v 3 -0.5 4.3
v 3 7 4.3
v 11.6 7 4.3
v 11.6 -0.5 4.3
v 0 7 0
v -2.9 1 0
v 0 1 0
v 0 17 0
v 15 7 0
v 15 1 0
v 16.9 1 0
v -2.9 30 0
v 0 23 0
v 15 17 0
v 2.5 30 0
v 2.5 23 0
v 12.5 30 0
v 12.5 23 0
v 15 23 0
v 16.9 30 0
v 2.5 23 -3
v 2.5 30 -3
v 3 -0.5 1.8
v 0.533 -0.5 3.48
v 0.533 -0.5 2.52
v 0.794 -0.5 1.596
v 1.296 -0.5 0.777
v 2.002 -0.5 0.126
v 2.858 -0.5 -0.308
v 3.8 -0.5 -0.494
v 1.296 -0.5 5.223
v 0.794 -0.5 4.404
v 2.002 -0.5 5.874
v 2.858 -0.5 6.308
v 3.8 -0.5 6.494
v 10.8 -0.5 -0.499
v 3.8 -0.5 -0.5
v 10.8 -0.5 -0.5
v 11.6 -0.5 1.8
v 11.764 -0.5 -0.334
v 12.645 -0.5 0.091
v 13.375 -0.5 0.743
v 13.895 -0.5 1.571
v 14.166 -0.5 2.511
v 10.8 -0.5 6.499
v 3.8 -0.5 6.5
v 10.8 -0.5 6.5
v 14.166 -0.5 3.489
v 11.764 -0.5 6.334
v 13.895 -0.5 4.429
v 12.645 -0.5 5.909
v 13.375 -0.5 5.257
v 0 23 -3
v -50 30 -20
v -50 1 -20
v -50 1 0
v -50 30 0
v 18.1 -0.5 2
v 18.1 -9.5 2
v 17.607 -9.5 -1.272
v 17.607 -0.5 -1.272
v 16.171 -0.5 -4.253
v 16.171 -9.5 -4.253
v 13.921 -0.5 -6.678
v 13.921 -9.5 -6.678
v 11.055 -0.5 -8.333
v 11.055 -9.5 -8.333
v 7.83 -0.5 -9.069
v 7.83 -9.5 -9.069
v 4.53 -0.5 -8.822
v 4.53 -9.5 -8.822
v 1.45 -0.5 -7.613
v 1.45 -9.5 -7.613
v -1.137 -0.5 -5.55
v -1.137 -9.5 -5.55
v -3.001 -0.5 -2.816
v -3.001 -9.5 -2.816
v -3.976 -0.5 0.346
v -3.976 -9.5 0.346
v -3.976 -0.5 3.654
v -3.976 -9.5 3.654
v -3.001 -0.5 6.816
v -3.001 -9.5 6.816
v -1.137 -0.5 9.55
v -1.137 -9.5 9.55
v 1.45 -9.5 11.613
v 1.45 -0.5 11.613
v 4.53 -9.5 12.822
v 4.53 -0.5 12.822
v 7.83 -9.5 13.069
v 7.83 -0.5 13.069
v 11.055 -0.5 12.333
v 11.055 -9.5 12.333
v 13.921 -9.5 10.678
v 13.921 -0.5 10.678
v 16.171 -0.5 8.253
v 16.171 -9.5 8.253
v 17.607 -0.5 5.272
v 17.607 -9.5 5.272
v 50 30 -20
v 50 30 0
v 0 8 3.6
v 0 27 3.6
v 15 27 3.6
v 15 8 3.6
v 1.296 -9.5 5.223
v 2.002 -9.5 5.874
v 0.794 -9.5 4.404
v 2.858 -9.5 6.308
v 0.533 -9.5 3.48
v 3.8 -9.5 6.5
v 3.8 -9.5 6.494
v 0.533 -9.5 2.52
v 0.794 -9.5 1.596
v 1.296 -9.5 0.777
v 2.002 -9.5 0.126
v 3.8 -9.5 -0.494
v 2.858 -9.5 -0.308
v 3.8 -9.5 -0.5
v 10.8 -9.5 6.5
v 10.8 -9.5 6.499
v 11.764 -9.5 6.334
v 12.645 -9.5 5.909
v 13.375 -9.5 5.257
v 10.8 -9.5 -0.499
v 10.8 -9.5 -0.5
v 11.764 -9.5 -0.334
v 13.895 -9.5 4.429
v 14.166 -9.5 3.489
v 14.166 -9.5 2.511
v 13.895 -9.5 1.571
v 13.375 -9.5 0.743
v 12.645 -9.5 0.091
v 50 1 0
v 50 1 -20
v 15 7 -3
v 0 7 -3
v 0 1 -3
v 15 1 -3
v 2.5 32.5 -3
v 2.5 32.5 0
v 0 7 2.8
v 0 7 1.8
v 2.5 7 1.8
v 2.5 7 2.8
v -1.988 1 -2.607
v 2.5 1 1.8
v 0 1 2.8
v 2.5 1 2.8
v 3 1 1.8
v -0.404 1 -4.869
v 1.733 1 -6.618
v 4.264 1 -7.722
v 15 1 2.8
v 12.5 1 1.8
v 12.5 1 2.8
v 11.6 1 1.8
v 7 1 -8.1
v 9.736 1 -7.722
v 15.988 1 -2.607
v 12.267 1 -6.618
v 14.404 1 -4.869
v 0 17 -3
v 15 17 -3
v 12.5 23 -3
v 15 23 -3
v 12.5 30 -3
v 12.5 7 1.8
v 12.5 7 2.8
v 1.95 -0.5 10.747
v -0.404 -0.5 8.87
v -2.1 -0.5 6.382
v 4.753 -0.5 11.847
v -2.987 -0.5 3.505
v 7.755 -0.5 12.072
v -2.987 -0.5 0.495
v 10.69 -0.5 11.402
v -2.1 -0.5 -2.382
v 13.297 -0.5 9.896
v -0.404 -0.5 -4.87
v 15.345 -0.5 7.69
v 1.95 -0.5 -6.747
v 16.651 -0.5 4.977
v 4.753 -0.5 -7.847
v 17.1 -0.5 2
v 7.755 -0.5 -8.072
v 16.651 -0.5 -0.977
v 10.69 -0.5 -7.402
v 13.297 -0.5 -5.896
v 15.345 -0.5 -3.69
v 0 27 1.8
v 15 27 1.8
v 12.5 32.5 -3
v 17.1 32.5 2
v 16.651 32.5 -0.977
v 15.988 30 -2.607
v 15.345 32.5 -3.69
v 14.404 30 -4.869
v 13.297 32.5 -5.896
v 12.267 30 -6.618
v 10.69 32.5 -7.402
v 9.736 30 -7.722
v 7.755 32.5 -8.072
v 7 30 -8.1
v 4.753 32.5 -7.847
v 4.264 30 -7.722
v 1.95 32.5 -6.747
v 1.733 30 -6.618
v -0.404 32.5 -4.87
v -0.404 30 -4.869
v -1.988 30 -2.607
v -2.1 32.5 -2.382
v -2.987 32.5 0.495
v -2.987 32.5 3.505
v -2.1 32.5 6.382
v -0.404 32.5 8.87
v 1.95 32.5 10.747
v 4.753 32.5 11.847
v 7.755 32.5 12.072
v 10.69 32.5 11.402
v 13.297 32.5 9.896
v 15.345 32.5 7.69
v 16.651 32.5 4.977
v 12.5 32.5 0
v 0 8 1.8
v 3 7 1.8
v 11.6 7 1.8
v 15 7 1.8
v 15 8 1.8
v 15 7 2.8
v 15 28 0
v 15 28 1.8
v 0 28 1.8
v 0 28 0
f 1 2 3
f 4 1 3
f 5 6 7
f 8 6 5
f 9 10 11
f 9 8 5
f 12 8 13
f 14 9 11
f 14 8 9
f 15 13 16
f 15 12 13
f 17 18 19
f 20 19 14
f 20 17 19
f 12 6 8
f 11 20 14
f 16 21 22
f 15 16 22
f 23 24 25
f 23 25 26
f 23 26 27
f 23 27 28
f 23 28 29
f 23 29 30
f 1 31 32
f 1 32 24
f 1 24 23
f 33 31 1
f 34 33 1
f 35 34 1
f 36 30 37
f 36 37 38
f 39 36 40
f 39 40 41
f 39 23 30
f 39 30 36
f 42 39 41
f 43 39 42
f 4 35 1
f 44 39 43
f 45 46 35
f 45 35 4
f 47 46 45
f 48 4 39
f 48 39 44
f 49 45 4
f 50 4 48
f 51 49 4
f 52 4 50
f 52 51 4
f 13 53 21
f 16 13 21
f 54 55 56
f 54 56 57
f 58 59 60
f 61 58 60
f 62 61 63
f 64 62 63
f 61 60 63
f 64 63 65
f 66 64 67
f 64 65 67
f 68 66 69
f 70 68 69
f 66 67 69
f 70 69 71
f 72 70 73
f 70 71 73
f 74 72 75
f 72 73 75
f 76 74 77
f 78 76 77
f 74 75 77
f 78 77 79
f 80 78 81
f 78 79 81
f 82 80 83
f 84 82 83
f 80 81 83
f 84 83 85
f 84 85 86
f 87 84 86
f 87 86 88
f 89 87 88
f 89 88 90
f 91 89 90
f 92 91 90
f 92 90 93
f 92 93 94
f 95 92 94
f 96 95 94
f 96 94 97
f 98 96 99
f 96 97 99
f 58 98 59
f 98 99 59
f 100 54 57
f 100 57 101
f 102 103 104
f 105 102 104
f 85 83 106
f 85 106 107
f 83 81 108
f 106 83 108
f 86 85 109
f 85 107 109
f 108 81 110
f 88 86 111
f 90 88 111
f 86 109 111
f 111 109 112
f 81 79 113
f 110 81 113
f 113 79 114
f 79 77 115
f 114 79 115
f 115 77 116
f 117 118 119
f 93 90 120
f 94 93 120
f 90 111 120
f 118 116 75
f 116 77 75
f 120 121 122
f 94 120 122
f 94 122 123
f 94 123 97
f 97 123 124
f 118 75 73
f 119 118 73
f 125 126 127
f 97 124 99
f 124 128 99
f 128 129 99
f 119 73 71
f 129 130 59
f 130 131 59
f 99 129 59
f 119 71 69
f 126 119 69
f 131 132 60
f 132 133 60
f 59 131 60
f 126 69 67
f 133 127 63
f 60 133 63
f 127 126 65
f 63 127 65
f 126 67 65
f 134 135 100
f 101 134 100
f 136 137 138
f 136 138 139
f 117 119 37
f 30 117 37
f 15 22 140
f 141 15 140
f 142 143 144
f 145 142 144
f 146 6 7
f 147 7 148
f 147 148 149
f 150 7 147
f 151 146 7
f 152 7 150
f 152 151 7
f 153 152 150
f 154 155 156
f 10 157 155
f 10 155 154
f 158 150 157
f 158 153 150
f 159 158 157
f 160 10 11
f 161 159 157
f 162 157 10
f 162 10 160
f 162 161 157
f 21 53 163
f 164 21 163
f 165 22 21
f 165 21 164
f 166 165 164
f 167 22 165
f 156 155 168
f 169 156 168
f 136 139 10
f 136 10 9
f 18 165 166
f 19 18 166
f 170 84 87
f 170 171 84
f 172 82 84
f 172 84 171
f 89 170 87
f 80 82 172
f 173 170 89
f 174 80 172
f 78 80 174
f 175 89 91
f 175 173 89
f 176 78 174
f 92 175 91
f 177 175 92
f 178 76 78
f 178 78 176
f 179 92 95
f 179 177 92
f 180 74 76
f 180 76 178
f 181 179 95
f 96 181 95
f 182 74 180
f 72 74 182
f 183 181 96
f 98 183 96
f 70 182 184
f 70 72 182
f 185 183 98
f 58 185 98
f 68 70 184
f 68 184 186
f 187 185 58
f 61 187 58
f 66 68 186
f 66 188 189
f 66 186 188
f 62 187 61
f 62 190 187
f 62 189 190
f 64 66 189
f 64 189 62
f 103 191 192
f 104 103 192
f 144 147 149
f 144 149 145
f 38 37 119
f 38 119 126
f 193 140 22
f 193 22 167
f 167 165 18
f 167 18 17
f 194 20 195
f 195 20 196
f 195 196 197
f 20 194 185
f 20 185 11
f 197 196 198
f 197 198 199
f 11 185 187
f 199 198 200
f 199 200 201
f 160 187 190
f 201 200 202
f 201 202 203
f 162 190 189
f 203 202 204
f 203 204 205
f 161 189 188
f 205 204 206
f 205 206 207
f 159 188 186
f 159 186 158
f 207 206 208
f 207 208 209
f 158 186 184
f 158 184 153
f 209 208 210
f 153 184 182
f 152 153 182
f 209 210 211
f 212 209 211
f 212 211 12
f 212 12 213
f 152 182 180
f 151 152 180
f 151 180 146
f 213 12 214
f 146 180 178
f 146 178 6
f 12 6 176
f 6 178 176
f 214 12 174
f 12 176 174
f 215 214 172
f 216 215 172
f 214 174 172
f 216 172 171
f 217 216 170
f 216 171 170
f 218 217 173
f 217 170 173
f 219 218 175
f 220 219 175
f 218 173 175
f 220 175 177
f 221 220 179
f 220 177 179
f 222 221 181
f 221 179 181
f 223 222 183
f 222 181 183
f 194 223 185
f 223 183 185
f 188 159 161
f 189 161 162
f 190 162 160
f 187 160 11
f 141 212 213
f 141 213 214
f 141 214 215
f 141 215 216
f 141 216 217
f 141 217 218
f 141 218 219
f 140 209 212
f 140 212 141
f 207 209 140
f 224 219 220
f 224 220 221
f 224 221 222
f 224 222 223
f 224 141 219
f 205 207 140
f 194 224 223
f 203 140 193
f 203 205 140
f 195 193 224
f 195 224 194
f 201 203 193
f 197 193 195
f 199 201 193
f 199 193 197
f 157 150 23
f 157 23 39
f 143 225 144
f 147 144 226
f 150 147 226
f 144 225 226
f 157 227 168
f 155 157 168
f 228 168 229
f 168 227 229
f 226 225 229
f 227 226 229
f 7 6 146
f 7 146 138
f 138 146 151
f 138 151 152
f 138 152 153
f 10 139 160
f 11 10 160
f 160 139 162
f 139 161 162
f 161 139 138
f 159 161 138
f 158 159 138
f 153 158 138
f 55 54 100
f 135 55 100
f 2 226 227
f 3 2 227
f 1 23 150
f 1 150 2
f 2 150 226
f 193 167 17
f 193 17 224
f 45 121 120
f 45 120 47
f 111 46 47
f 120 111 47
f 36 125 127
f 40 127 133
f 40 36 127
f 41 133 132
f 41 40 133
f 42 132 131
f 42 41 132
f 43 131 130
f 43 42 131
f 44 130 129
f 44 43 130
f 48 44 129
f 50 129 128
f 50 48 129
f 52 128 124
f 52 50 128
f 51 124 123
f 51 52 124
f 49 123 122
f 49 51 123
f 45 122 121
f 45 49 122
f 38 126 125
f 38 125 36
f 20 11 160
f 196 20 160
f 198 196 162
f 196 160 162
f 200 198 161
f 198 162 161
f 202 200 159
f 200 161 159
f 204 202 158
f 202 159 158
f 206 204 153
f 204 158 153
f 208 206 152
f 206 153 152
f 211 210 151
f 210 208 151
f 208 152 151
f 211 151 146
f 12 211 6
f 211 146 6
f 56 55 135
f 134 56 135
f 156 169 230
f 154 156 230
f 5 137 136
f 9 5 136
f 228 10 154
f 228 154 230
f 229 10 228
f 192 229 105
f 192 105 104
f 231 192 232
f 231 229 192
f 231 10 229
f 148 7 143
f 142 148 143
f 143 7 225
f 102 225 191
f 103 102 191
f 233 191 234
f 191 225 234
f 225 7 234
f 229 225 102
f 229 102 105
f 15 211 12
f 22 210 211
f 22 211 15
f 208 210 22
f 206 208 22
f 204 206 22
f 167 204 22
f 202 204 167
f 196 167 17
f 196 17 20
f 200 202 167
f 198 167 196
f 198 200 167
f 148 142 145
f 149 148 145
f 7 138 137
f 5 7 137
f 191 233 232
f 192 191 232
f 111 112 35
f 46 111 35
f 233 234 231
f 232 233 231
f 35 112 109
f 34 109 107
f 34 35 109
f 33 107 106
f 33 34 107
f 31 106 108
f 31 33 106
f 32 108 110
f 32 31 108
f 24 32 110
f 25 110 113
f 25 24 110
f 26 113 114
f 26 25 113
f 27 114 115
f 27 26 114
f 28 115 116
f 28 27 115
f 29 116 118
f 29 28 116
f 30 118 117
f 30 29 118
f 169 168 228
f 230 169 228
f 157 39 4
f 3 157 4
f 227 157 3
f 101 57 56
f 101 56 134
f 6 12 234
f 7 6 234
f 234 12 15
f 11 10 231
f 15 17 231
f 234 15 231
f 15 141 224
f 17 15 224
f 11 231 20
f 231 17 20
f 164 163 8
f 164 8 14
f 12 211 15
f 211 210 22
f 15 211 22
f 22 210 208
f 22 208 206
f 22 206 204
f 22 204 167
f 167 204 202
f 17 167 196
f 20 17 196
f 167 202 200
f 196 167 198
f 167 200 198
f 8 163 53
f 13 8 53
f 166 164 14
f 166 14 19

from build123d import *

# Parameters (mm, degrees)
BOX008_W               = 100
BOX008_H               = 29
BOX008_DEPTH           = 20
CYLINDER002_R          = 3.5
CYLINDER002_DEPTH      = 12
CYLINDER002_ROLL_ANGLE = 90
CYLINDER003_R          = 3.5
CYLINDER003_DEPTH      = 12
CYLINDER003_ROLL_ANGLE = 90
BOX009_W               = 7
BOX009_H               = 12
BOX009_DEPTH           = 7
BOX002_W               = 8.6
BOX002_H               = 8
BOX002_DEPTH           = 2.5
BOX001_W               = 15
BOX001_H               = 19
BOX001_DEPTH           = 1.8
BOX004_W               = 10
BOX004_H               = 15
BOX004_DEPTH           = 3
BOX003_W               = 15
BOX003_H               = 6
BOX003_DEPTH           = 3
BOX_W                  = 15
BOX_H                  = 27
BOX_DEPTH              = 1.8
BOX007_W               = 2.5
BOX007_H               = 6
BOX007_DEPTH           = 1
BOX005_W               = 15
BOX005_H               = 6
BOX005_DEPTH           = 3
BOX006_W               = 2.5
BOX006_H               = 6
BOX006_DEPTH           = 1
CYLINDER_R             = 10.1
CYLINDER_DEPTH         = 33
CYLINDER_ROLL_ANGLE    = -90
CYLINDER001_R          = 11.1
CYLINDER001_DEPTH      = 9
CYLINDER001_ROLL_ANGLE = -90
BOX022_W               = 100
BOX022_H               = 29
BOX022_DEPTH           = 20
BOX012_W               = 100
BOX012_H               = 100
BOX012_DEPTH           = 40
BOX010_W               = 100
BOX010_H               = 100
BOX010_DEPTH           = 40
BOX011_W               = 100
BOX011_H               = 29
BOX011_DEPTH           = 20
CYLINDER004_R          = 3.5
CYLINDER004_DEPTH      = 12
CYLINDER004_ROLL_ANGLE = 90
CYLINDER007_R          = 3.5
CYLINDER007_DEPTH      = 12
CYLINDER007_ROLL_ANGLE = 90
BOX023_W               = 20
BOX023_H               = 12
BOX023_DEPTH           = 7
BOX016_W               = 8.6
BOX016_H               = 8
BOX016_DEPTH           = 2.5
BOX015_W               = 15
BOX015_H               = 19
BOX015_DEPTH           = 1.8
BOX018_W               = 10
BOX018_H               = 15
BOX018_DEPTH           = 3
BOX017_W               = 15
BOX017_H               = 6
BOX017_DEPTH           = 3
BOX014_W               = 15
BOX014_H               = 27
BOX014_DEPTH           = 1.8
BOX021_W               = 2.5
BOX021_H               = 6
BOX021_DEPTH           = 1
BOX019_W               = 15
BOX019_H               = 6
BOX019_DEPTH           = 3
BOX020_W               = 2.5
BOX020_H               = 6
BOX020_DEPTH           = 1
CYLINDER005_R          = 10.1
CYLINDER005_DEPTH      = 33
CYLINDER005_ROLL_ANGLE = -90
CYLINDER006_R          = 11.1
CYLINDER006_DEPTH      = 10
CYLINDER006_ROLL_ANGLE = -90


with BuildPart() as box008:
    # Box008 → Box008 (new body)
    with BuildSketch(Plane(origin=(-50, 1, -20), x_dir=(1, 0, 0), z_dir=(0, 0, 1))):
        with Locations((50, 14.5)):
            Rectangle(BOX008_W, BOX008_H)
    extrude(amount=BOX008_DEPTH)


with BuildPart() as cylinder002:
    # Cylinder002 → Cylinder002 (new body)
    with BuildSketch(Plane.XY):
        Circle(CYLINDER002_R)
    extrude(amount=CYLINDER002_DEPTH)


with BuildPart() as cylinder002_1:
    # Cylinder002 roll: moved
    add(cylinder002.part.rotate(Axis((0, 0, 0), (1, 0, 0)), CYLINDER002_ROLL_ANGLE))


with BuildPart() as cylinder002_2:
    # Cylinder002 placement: moved
    add(cylinder002_1.part.moved(Location((4, 0, 3))))


with BuildPart() as cylinder003:
    # Cylinder003 → Cylinder003 (new body)
    with BuildSketch(Plane.XY):
        Circle(CYLINDER003_R)
    extrude(amount=CYLINDER003_DEPTH)


with BuildPart() as cylinder003_1:
    # Cylinder003 roll: moved
    add(cylinder003.part.rotate(Axis((0, 0, 0), (1, 0, 0)), CYLINDER003_ROLL_ANGLE))


with BuildPart() as cylinder003_2:
    # Cylinder003 placement: moved
    add(cylinder003_1.part.moved(Location((10.7, 0, 3))))


with BuildPart() as fusion002:
    # Box009 → Box009 (new body)
    with BuildSketch(Plane(origin=(3.8, -12, -0.5), x_dir=(1, 0, 0), z_dir=(0, 0, 1))):
        with Locations((3.5, 6)):
            Rectangle(BOX009_W, BOX009_H)
    extrude(amount=BOX009_DEPTH)

    # Fusion002: union Cylinder002, Cylinder003
    add(cylinder002_2.part)
    add(cylinder003_2.part)


with BuildPart() as fusion002_1:
    # Fusion002 placement: moved
    add(fusion002.part.moved(Location((0, -0.5, 0))))


with BuildPart() as box002:
    # Box002 → Box002 (new body)
    with BuildSketch(Plane(origin=(3, -2, 1.8), x_dir=(1, 0, 0), z_dir=(0, 0, 1))):
        with Locations((4.3, 4)):
            Rectangle(BOX002_W, BOX002_H)
    extrude(amount=BOX002_DEPTH)


with BuildPart() as box001:
    # Box001 → Box001 (new body)
    with BuildSketch(Plane(origin=(0, 7, 1.8), x_dir=(1, 0, 0), z_dir=(0, 0, 1))):
        with Locations((7.5, 9.5)):
            Rectangle(BOX001_W, BOX001_H)
    extrude(amount=BOX001_DEPTH)


with BuildPart() as box004:
    # Box004 → Box004 (new body)
    with BuildSketch(Plane(origin=(2.5, 22, -3), x_dir=(1, 0, 0), z_dir=(0, 0, 1))):
        with Locations((5, 7.5)):
            Rectangle(BOX004_W, BOX004_H)
    extrude(amount=BOX004_DEPTH)


with BuildPart() as box003:
    # Box003 → Box003 (new body)
    with BuildSketch(Plane(origin=(0, 16, -3), x_dir=(1, 0, 0), z_dir=(0, 0, 1))):
        with Locations((7.5, 3)):
            Rectangle(BOX003_W, BOX003_H)
    extrude(amount=BOX003_DEPTH)


with BuildPart() as box:
    # Box → Box (new body)
    with BuildSketch(Plane.XY):
        with Locations((7.5, 13.5)):
            Rectangle(BOX_W, BOX_H)
    extrude(amount=BOX_DEPTH)


with BuildPart() as box007:
    # Box007 → Box007 (new body)
    with BuildSketch(Plane(origin=(12.5, 0, 1.8), x_dir=(1, 0, 0), z_dir=(0, 0, 1))):
        with Locations((1.25, 3)):
            Rectangle(BOX007_W, BOX007_H)
    extrude(amount=BOX007_DEPTH)


with BuildPart() as box005:
    # Box005 → Box005 (new body)
    with BuildSketch(Plane.XY.offset(-3)):
        with Locations((7.5, 3)):
            Rectangle(BOX005_W, BOX005_H)
    extrude(amount=BOX005_DEPTH)


with BuildPart() as fusion:
    # Box006 → Box006 (new body)
    with BuildSketch(Plane.XY.offset(1.8)):
        with Locations((1.25, 3)):
            Rectangle(BOX006_W, BOX006_H)
    extrude(amount=BOX006_DEPTH)

    # Fusion: union Box002, Box001, Box004, Box003, Box, Box007, Box005
    add(box002.part)
    add(box001.part)
    add(box004.part)
    add(box003.part)
    add(box.part)
    add(box007.part)
    add(box005.part)


with BuildPart() as fusion_1:
    # Fusion placement: moved
    add(fusion.part.moved(Location((0, 1, 0))))


with BuildPart() as cylinder:
    # Cylinder → Cylinder (new body)
    with BuildSketch(Plane.XY):
        Circle(CYLINDER_R)
    extrude(amount=CYLINDER_DEPTH)


with BuildPart() as cylinder_1:
    # Cylinder roll: moved
    add(cylinder.part.rotate(Axis((0, 0, 0), (1, 0, 0)), CYLINDER_ROLL_ANGLE))


with BuildPart() as cylinder_2:
    # Cylinder placement: moved
    add(cylinder_1.part.moved(Location((7, -0.5, 2))))


with BuildPart() as cut002:
    # Cylinder001 → Cylinder001 (new body)
    with BuildSketch(Plane.XY):
        Circle(CYLINDER001_R)
    extrude(amount=CYLINDER001_DEPTH)


with BuildPart() as cut002_1:
    # Cylinder001 roll: moved
    add(cut002.part.rotate(Axis((0, 0, 0), (1, 0, 0)), CYLINDER001_ROLL_ANGLE))


with BuildPart() as cut002_2:
    # Cylinder001 placement: moved
    add(cut002_1.part.moved(Location((7, -9.5, 2))))

    # Fusion001: union Cylinder
    add(cylinder_2.part)

    # Cut: cut Fusion
    add(fusion_1.part, mode=Mode.SUBTRACT)

    # Cut001: cut Fusion002
    add(fusion002_1.part, mode=Mode.SUBTRACT)

    # Cut002: cut Box008
    add(box008.part, mode=Mode.SUBTRACT)


with BuildPart() as box022:
    # Box022 → Box022 (new body)
    with BuildSketch(Plane(origin=(-50, 1, -20), x_dir=(1, 0, 0), z_dir=(0, 0, 1))):
        with Locations((50, 14.5)):
            Rectangle(BOX022_W, BOX022_H)
    extrude(amount=BOX022_DEPTH)


with BuildPart() as box012:
    # Box012 → Box012 (new body)
    with BuildSketch(Plane(origin=(-50, 30, -20), x_dir=(1, 0, 0), z_dir=(0, 0, 1))):
        with Locations((50, 50)):
            Rectangle(BOX012_W, BOX012_H)
    extrude(amount=BOX012_DEPTH)


with BuildPart() as box010:
    # Box010 → Box010 (new body)
    with BuildSketch(Plane(origin=(-50, -99, -20), x_dir=(1, 0, 0), z_dir=(0, 0, 1))):
        with Locations((50, 50)):
            Rectangle(BOX010_W, BOX010_H)
    extrude(amount=BOX010_DEPTH)


with BuildPart() as fusion007:
    # Box011 → Box011 (new body)
    with BuildSketch(Plane(origin=(-50, 1, 0), x_dir=(1, 0, 0), z_dir=(0, 0, 1))):
        with Locations((50, 14.5)):
            Rectangle(BOX011_W, BOX011_H)
    extrude(amount=BOX011_DEPTH)

    # Fusion007: union Box012, Box010
    add(box012.part)
    add(box010.part)


with BuildPart() as cylinder004:
    # Cylinder004 → Cylinder004 (new body)
    with BuildSketch(Plane.XY):
        Circle(CYLINDER004_R)
    extrude(amount=CYLINDER004_DEPTH)


with BuildPart() as cylinder004_1:
    # Cylinder004 roll: moved
    add(cylinder004.part.rotate(Axis((0, 0, 0), (1, 0, 0)), CYLINDER004_ROLL_ANGLE))


with BuildPart() as cylinder004_2:
    # Cylinder004 placement: moved
    add(cylinder004_1.part.moved(Location((4, 0, 3))))


with BuildPart() as cylinder007:
    # Cylinder007 → Cylinder007 (new body)
    with BuildSketch(Plane.XY):
        Circle(CYLINDER007_R)
    extrude(amount=CYLINDER007_DEPTH)


with BuildPart() as cylinder007_1:
    # Cylinder007 roll: moved
    add(cylinder007.part.rotate(Axis((0, 0, 0), (1, 0, 0)), CYLINDER007_ROLL_ANGLE))


with BuildPart() as cylinder007_2:
    # Cylinder007 placement: moved
    add(cylinder007_1.part.moved(Location((10.7, 0, 3))))


with BuildPart() as fusion006:
    # Box023 → Box023 (new body)
    with BuildSketch(Plane(origin=(3.8, -12, -0.5), x_dir=(1, 0, 0), z_dir=(0, 0, 1))):
        with Locations((10, 6)):
            Rectangle(BOX023_W, BOX023_H)
    extrude(amount=BOX023_DEPTH)

    # Fusion006: union Cylinder004, Cylinder007
    add(cylinder004_2.part)
    add(cylinder007_2.part)


with BuildPart() as fusion006_1:
    # Fusion006 placement: moved
    add(fusion006.part.moved(Location((0, -0.5, 0))))


with BuildPart() as box016:
    # Box016 → Box016 (new body)
    with BuildSketch(Plane(origin=(3, -2, 1.8), x_dir=(1, 0, 0), z_dir=(0, 0, 1))):
        with Locations((4.3, 4)):
            Rectangle(BOX016_W, BOX016_H)
    extrude(amount=BOX016_DEPTH)


with BuildPart() as box015:
    # Box015 → Box015 (new body)
    with BuildSketch(Plane(origin=(0, 7, 1.8), x_dir=(1, 0, 0), z_dir=(0, 0, 1))):
        with Locations((7.5, 9.5)):
            Rectangle(BOX015_W, BOX015_H)
    extrude(amount=BOX015_DEPTH)


with BuildPart() as box018:
    # Box018 → Box018 (new body)
    with BuildSketch(Plane(origin=(2.5, 22, -3), x_dir=(1, 0, 0), z_dir=(0, 0, 1))):
        with Locations((5, 7.5)):
            Rectangle(BOX018_W, BOX018_H)
    extrude(amount=BOX018_DEPTH)


with BuildPart() as box017:
    # Box017 → Box017 (new body)
    with BuildSketch(Plane(origin=(0, 16, -3), x_dir=(1, 0, 0), z_dir=(0, 0, 1))):
        with Locations((7.5, 3)):
            Rectangle(BOX017_W, BOX017_H)
    extrude(amount=BOX017_DEPTH)


with BuildPart() as box014:
    # Box014 → Box014 (new body)
    with BuildSketch(Plane.XY):
        with Locations((7.5, 13.5)):
            Rectangle(BOX014_W, BOX014_H)
    extrude(amount=BOX014_DEPTH)


with BuildPart() as box021:
    # Box021 → Box021 (new body)
    with BuildSketch(Plane(origin=(12.5, 0, 1.8), x_dir=(1, 0, 0), z_dir=(0, 0, 1))):
        with Locations((1.25, 3)):
            Rectangle(BOX021_W, BOX021_H)
    extrude(amount=BOX021_DEPTH)


with BuildPart() as box019:
    # Box019 → Box019 (new body)
    with BuildSketch(Plane.XY.offset(-3)):
        with Locations((7.5, 3)):
            Rectangle(BOX019_W, BOX019_H)
    extrude(amount=BOX019_DEPTH)


with BuildPart() as fusion005:
    # Box020 → Box020 (new body)
    with BuildSketch(Plane.XY.offset(1.8)):
        with Locations((1.25, 3)):
            Rectangle(BOX020_W, BOX020_H)
    extrude(amount=BOX020_DEPTH)

    # Fusion005: union Box016, Box015, Box018, Box017, Box014, Box021, Box019
    add(box016.part)
    add(box015.part)
    add(box018.part)
    add(box017.part)
    add(box014.part)
    add(box021.part)
    add(box019.part)


with BuildPart() as fusion005_1:
    # Fusion005 placement: moved
    add(fusion005.part.moved(Location((0, 1, 0))))


with BuildPart() as cylinder005:
    # Cylinder005 → Cylinder005 (new body)
    with BuildSketch(Plane.XY):
        Circle(CYLINDER005_R)
    extrude(amount=CYLINDER005_DEPTH)


with BuildPart() as cylinder005_1:
    # Cylinder005 roll: moved
    add(cylinder005.part.rotate(Axis((0, 0, 0), (1, 0, 0)), CYLINDER005_ROLL_ANGLE))


with BuildPart() as cylinder005_2:
    # Cylinder005 placement: moved
    add(cylinder005_1.part.moved(Location((7, -0.5, 2))))


with BuildPart() as cut005:
    # Cylinder006 → Cylinder006 (new body)
    with BuildSketch(Plane.XY):
        Circle(CYLINDER006_R)
    extrude(amount=CYLINDER006_DEPTH)


with BuildPart() as cut005_1:
    # Cylinder006 roll: moved
    add(cut005.part.rotate(Axis((0, 0, 0), (1, 0, 0)), CYLINDER006_ROLL_ANGLE))


with BuildPart() as cut005_2:
    # Cylinder006 placement: moved
    add(cut005_1.part.moved(Location((7, -10.5, 2))))

    # Fusion004: union Cylinder005
    add(cylinder005_2.part)

    # Cut003: cut Fusion005
    add(fusion005_1.part, mode=Mode.SUBTRACT)

    # Cut004: cut Fusion006
    add(fusion006_1.part, mode=Mode.SUBTRACT)

    # Cut005: cut Fusion007
    add(fusion007.part, mode=Mode.SUBTRACT)


solid = Compound([cut002_2.part, box022.part, cut005_2.part])
